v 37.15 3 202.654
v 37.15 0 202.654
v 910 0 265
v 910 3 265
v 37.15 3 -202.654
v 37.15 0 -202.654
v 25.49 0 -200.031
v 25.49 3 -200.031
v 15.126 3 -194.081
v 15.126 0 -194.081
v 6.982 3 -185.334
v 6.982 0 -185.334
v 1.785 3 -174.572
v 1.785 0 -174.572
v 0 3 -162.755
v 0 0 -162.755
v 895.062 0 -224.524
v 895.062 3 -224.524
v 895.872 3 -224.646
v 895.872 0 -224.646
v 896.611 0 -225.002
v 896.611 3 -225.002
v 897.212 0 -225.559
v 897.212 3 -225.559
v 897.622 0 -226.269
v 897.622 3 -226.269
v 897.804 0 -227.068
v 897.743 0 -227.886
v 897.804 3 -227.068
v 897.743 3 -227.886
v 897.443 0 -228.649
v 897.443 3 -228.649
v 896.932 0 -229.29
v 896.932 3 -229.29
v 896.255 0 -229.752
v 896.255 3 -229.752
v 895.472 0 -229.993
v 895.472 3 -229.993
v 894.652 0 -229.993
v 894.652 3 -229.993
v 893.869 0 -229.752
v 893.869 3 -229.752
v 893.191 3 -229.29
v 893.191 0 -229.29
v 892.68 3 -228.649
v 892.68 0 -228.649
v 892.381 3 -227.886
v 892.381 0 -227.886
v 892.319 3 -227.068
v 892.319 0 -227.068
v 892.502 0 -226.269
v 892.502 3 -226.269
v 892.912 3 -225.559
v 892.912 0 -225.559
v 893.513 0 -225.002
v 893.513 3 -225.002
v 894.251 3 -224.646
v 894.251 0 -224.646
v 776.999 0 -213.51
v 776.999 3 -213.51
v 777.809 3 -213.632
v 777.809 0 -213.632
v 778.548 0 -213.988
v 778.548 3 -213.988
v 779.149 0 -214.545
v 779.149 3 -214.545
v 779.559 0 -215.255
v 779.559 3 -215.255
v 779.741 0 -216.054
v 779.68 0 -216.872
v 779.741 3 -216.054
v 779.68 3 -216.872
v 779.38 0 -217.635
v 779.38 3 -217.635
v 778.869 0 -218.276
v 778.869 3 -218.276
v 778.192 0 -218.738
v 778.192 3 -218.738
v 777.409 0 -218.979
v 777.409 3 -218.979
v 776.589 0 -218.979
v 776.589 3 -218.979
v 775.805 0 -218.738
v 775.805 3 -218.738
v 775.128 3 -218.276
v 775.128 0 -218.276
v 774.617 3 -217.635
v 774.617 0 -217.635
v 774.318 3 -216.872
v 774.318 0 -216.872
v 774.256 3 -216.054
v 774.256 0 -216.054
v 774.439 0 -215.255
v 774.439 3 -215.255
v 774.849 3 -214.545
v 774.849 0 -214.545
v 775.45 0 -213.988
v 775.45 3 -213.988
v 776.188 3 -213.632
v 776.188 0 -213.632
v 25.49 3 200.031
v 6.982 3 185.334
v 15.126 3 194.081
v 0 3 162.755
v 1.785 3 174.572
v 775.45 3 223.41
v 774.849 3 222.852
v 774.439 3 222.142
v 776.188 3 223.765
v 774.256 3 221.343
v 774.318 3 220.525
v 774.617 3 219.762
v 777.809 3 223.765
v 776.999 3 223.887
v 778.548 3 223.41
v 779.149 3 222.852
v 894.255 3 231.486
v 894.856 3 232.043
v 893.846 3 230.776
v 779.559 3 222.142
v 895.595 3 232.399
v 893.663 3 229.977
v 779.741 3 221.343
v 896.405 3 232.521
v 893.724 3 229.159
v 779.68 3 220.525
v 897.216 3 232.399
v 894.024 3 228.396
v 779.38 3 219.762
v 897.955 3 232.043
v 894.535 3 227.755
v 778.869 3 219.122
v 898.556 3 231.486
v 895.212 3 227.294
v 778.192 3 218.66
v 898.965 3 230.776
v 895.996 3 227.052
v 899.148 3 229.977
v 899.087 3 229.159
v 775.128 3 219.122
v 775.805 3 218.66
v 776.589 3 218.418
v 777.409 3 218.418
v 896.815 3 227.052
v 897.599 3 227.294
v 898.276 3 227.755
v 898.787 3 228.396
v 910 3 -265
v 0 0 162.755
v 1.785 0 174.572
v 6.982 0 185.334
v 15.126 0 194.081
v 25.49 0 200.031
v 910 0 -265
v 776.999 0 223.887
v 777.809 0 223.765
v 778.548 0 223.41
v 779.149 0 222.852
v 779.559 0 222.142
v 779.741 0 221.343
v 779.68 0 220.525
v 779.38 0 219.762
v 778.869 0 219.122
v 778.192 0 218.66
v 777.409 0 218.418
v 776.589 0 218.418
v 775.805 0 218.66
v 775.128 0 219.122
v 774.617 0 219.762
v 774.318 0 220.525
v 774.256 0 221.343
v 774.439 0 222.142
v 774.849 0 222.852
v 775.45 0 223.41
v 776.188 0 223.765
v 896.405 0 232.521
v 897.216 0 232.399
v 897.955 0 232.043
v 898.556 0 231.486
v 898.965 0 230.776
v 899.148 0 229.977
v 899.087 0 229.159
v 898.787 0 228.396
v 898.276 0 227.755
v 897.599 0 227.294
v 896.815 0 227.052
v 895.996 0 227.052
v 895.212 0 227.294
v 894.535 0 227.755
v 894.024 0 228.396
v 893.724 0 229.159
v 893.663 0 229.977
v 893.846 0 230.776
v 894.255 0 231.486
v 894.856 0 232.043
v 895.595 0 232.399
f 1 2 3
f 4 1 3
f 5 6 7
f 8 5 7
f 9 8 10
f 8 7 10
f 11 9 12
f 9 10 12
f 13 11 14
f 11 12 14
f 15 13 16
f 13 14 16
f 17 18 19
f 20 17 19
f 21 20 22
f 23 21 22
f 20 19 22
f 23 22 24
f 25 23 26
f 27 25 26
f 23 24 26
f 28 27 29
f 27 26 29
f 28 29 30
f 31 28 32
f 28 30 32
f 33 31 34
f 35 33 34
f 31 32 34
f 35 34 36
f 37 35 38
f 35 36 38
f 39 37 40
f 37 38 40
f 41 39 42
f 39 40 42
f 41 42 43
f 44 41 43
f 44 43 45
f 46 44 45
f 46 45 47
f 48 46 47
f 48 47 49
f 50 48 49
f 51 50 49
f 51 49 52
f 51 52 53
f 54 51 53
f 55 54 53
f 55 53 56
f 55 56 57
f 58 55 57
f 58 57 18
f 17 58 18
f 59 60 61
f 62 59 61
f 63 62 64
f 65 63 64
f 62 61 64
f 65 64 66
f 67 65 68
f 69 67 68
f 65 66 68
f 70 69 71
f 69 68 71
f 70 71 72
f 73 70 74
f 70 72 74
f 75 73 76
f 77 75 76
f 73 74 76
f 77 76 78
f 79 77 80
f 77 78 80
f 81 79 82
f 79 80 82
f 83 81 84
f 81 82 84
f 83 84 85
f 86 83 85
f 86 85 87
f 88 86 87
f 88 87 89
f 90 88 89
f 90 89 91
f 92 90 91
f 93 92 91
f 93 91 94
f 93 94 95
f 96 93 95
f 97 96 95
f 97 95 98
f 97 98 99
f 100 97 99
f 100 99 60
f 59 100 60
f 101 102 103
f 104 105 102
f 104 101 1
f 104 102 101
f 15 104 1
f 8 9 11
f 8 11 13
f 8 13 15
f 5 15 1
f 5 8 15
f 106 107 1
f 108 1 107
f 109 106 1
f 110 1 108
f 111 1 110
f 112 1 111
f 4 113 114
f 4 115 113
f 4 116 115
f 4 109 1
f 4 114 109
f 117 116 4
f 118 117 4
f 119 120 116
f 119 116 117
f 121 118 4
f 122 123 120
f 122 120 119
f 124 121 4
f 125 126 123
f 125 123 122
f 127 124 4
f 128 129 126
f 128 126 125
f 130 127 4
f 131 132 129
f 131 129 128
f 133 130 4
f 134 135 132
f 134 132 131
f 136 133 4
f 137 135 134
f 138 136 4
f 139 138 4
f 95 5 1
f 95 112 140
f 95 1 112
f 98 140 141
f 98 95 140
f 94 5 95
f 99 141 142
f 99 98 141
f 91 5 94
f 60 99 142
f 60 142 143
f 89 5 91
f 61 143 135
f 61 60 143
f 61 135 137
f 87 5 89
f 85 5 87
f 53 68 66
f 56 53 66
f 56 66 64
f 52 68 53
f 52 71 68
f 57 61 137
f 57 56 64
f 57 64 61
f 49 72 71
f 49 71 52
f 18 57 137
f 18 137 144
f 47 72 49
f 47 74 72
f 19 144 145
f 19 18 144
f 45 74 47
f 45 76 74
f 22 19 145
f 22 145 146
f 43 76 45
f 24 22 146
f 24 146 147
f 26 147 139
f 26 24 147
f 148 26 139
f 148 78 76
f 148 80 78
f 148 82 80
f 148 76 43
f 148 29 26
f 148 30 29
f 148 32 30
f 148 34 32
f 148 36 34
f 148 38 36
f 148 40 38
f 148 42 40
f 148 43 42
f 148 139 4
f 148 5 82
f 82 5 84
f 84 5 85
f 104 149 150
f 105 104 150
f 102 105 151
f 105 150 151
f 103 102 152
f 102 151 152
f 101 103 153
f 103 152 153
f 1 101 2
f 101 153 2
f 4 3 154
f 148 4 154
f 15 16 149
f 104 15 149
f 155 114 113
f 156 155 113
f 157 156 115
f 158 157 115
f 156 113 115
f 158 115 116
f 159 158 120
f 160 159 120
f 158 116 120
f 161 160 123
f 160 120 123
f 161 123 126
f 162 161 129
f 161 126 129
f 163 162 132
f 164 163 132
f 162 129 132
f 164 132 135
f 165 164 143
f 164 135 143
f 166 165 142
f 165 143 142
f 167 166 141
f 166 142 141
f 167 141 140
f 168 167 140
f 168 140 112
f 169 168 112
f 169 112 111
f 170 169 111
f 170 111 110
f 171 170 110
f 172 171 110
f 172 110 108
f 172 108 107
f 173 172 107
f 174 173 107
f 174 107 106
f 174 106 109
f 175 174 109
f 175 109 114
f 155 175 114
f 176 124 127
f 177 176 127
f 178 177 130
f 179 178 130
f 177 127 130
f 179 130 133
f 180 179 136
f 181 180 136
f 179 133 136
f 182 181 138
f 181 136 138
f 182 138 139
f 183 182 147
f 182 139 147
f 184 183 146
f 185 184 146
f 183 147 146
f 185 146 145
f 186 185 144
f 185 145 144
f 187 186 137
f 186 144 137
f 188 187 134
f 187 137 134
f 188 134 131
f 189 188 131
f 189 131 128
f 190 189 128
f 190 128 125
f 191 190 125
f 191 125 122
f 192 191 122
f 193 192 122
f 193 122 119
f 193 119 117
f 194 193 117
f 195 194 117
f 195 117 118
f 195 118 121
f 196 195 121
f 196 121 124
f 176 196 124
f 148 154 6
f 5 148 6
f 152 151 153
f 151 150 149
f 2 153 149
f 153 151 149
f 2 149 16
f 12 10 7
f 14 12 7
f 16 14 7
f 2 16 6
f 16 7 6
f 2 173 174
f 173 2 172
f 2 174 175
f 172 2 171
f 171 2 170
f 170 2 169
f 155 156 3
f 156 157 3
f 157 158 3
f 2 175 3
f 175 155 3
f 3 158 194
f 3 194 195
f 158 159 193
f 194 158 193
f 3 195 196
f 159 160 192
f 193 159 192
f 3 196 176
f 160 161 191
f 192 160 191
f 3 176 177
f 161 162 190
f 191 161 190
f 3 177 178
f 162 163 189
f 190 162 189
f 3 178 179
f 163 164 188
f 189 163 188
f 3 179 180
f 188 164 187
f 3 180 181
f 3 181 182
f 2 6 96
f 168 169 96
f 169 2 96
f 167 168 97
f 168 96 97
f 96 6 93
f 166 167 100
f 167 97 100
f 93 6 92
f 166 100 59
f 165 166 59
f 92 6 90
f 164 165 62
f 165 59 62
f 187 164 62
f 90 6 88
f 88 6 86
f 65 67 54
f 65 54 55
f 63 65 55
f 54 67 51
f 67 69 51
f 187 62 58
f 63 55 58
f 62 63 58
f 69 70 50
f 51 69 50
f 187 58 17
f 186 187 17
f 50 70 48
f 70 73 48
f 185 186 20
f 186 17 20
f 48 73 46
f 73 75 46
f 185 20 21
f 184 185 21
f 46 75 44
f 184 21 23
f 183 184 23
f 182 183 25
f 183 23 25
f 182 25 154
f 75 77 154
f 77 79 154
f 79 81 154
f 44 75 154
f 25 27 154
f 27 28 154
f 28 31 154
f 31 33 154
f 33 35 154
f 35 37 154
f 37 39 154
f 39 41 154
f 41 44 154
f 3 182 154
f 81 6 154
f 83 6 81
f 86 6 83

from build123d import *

# Parameters (mm, degrees)
RESSALTO_EXTRUS_O1_DEPTH = 3
SKETCH1_R                = 2.75
CUT_EXTRUDE1_DEPTH       = 10


with BuildPart() as part:
    # Esboço1 → Ressalto-extrusão1 (new body)
    with BuildSketch(Plane(origin=(0, 0, 0), x_dir=(1, 0, 0), z_dir=(0, 1, 0))):
        with BuildLine():
            Line((0, 162.755231864), (0, -162.755231864))
            ThreePointArc((0, -162.755231864), (10.725477972, -190.013301495), (37.150118, -202.653579857))
            Line((37.150118, -202.653579857), (910, -265))
            Line((910, -265), (910, 265))
            Line((910, 265), (37.150118, 202.653579857))
            ThreePointArc((37.150118, 202.653579857), (10.725477972, 190.013301495), (0, 162.755231864))
        make_face()
    extrude(amount=RESSALTO_EXTRUS_O1_DEPTH)

    # Sketch1 → Cut-Extrude1 (cut)
    with BuildSketch(Plane(origin=(0, 3, 0), x_dir=(1, 0, 0), z_dir=(0, 1, 0))):
        with Locations(Location((776.99864992, -221.137424035, 0), (0, 0, 270))):
            Circle(SKETCH1_R)
        with Locations(Location((896.405474423, -229.771178815, 0), (0, 0, 270))):
            Circle(SKETCH1_R)
        with Locations(Location((776.99864992, 216.259876239, 0), (0, 0, 270))):
            Circle(SKETCH1_R)
        with Locations(Location((895.061762745, 227.273960295, 0), (0, 0, 270))):
            Circle(SKETCH1_R)
    extrude(amount=-CUT_EXTRUDE1_DEPTH, mode=Mode.SUBTRACT)


solid = part.part
